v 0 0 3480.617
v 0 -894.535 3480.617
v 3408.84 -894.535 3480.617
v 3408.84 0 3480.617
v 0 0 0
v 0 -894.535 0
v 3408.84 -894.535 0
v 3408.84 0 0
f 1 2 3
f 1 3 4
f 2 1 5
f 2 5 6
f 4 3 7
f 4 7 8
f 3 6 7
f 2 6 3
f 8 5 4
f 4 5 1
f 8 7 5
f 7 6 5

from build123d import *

# Parameters (mm, degrees)
F1_W     = 454.2112052441
F1_H     = 781.1917066574
F2_DEPTH = 894.5351783186
F3_DEPTH = 2699.4251012802
F4_W     = 894.5351783186
F4_H     = 3480.6168079376
F5_DEPTH = 2954.6291828156


with BuildPart() as f2:
    # F1 (on face) → F2 (new body)
    with BuildSketch(Plane.XZ):
        with Locations((227.105602622, 390.5958533287)):
            Rectangle(F1_W, F1_H)
    extrude(amount=F2_DEPTH)

    # F3 (add): a face of the model
    f3_faces = [f2.faces().sort_by_distance(p)[0] for p in [
        (227.105602622, -447.2675891593, 781.1917066574),
    ]]
    extrude(f3_faces, amount=F3_DEPTH)

    # F4 (on face) → F5 (join)
    with BuildSketch(Plane.YZ.offset(454.2112052441)):
        with Locations((-447.2675891593, 1740.3084039688)):
            Rectangle(F4_W, F4_H)
    extrude(amount=F5_DEPTH)


solid = f2.part
